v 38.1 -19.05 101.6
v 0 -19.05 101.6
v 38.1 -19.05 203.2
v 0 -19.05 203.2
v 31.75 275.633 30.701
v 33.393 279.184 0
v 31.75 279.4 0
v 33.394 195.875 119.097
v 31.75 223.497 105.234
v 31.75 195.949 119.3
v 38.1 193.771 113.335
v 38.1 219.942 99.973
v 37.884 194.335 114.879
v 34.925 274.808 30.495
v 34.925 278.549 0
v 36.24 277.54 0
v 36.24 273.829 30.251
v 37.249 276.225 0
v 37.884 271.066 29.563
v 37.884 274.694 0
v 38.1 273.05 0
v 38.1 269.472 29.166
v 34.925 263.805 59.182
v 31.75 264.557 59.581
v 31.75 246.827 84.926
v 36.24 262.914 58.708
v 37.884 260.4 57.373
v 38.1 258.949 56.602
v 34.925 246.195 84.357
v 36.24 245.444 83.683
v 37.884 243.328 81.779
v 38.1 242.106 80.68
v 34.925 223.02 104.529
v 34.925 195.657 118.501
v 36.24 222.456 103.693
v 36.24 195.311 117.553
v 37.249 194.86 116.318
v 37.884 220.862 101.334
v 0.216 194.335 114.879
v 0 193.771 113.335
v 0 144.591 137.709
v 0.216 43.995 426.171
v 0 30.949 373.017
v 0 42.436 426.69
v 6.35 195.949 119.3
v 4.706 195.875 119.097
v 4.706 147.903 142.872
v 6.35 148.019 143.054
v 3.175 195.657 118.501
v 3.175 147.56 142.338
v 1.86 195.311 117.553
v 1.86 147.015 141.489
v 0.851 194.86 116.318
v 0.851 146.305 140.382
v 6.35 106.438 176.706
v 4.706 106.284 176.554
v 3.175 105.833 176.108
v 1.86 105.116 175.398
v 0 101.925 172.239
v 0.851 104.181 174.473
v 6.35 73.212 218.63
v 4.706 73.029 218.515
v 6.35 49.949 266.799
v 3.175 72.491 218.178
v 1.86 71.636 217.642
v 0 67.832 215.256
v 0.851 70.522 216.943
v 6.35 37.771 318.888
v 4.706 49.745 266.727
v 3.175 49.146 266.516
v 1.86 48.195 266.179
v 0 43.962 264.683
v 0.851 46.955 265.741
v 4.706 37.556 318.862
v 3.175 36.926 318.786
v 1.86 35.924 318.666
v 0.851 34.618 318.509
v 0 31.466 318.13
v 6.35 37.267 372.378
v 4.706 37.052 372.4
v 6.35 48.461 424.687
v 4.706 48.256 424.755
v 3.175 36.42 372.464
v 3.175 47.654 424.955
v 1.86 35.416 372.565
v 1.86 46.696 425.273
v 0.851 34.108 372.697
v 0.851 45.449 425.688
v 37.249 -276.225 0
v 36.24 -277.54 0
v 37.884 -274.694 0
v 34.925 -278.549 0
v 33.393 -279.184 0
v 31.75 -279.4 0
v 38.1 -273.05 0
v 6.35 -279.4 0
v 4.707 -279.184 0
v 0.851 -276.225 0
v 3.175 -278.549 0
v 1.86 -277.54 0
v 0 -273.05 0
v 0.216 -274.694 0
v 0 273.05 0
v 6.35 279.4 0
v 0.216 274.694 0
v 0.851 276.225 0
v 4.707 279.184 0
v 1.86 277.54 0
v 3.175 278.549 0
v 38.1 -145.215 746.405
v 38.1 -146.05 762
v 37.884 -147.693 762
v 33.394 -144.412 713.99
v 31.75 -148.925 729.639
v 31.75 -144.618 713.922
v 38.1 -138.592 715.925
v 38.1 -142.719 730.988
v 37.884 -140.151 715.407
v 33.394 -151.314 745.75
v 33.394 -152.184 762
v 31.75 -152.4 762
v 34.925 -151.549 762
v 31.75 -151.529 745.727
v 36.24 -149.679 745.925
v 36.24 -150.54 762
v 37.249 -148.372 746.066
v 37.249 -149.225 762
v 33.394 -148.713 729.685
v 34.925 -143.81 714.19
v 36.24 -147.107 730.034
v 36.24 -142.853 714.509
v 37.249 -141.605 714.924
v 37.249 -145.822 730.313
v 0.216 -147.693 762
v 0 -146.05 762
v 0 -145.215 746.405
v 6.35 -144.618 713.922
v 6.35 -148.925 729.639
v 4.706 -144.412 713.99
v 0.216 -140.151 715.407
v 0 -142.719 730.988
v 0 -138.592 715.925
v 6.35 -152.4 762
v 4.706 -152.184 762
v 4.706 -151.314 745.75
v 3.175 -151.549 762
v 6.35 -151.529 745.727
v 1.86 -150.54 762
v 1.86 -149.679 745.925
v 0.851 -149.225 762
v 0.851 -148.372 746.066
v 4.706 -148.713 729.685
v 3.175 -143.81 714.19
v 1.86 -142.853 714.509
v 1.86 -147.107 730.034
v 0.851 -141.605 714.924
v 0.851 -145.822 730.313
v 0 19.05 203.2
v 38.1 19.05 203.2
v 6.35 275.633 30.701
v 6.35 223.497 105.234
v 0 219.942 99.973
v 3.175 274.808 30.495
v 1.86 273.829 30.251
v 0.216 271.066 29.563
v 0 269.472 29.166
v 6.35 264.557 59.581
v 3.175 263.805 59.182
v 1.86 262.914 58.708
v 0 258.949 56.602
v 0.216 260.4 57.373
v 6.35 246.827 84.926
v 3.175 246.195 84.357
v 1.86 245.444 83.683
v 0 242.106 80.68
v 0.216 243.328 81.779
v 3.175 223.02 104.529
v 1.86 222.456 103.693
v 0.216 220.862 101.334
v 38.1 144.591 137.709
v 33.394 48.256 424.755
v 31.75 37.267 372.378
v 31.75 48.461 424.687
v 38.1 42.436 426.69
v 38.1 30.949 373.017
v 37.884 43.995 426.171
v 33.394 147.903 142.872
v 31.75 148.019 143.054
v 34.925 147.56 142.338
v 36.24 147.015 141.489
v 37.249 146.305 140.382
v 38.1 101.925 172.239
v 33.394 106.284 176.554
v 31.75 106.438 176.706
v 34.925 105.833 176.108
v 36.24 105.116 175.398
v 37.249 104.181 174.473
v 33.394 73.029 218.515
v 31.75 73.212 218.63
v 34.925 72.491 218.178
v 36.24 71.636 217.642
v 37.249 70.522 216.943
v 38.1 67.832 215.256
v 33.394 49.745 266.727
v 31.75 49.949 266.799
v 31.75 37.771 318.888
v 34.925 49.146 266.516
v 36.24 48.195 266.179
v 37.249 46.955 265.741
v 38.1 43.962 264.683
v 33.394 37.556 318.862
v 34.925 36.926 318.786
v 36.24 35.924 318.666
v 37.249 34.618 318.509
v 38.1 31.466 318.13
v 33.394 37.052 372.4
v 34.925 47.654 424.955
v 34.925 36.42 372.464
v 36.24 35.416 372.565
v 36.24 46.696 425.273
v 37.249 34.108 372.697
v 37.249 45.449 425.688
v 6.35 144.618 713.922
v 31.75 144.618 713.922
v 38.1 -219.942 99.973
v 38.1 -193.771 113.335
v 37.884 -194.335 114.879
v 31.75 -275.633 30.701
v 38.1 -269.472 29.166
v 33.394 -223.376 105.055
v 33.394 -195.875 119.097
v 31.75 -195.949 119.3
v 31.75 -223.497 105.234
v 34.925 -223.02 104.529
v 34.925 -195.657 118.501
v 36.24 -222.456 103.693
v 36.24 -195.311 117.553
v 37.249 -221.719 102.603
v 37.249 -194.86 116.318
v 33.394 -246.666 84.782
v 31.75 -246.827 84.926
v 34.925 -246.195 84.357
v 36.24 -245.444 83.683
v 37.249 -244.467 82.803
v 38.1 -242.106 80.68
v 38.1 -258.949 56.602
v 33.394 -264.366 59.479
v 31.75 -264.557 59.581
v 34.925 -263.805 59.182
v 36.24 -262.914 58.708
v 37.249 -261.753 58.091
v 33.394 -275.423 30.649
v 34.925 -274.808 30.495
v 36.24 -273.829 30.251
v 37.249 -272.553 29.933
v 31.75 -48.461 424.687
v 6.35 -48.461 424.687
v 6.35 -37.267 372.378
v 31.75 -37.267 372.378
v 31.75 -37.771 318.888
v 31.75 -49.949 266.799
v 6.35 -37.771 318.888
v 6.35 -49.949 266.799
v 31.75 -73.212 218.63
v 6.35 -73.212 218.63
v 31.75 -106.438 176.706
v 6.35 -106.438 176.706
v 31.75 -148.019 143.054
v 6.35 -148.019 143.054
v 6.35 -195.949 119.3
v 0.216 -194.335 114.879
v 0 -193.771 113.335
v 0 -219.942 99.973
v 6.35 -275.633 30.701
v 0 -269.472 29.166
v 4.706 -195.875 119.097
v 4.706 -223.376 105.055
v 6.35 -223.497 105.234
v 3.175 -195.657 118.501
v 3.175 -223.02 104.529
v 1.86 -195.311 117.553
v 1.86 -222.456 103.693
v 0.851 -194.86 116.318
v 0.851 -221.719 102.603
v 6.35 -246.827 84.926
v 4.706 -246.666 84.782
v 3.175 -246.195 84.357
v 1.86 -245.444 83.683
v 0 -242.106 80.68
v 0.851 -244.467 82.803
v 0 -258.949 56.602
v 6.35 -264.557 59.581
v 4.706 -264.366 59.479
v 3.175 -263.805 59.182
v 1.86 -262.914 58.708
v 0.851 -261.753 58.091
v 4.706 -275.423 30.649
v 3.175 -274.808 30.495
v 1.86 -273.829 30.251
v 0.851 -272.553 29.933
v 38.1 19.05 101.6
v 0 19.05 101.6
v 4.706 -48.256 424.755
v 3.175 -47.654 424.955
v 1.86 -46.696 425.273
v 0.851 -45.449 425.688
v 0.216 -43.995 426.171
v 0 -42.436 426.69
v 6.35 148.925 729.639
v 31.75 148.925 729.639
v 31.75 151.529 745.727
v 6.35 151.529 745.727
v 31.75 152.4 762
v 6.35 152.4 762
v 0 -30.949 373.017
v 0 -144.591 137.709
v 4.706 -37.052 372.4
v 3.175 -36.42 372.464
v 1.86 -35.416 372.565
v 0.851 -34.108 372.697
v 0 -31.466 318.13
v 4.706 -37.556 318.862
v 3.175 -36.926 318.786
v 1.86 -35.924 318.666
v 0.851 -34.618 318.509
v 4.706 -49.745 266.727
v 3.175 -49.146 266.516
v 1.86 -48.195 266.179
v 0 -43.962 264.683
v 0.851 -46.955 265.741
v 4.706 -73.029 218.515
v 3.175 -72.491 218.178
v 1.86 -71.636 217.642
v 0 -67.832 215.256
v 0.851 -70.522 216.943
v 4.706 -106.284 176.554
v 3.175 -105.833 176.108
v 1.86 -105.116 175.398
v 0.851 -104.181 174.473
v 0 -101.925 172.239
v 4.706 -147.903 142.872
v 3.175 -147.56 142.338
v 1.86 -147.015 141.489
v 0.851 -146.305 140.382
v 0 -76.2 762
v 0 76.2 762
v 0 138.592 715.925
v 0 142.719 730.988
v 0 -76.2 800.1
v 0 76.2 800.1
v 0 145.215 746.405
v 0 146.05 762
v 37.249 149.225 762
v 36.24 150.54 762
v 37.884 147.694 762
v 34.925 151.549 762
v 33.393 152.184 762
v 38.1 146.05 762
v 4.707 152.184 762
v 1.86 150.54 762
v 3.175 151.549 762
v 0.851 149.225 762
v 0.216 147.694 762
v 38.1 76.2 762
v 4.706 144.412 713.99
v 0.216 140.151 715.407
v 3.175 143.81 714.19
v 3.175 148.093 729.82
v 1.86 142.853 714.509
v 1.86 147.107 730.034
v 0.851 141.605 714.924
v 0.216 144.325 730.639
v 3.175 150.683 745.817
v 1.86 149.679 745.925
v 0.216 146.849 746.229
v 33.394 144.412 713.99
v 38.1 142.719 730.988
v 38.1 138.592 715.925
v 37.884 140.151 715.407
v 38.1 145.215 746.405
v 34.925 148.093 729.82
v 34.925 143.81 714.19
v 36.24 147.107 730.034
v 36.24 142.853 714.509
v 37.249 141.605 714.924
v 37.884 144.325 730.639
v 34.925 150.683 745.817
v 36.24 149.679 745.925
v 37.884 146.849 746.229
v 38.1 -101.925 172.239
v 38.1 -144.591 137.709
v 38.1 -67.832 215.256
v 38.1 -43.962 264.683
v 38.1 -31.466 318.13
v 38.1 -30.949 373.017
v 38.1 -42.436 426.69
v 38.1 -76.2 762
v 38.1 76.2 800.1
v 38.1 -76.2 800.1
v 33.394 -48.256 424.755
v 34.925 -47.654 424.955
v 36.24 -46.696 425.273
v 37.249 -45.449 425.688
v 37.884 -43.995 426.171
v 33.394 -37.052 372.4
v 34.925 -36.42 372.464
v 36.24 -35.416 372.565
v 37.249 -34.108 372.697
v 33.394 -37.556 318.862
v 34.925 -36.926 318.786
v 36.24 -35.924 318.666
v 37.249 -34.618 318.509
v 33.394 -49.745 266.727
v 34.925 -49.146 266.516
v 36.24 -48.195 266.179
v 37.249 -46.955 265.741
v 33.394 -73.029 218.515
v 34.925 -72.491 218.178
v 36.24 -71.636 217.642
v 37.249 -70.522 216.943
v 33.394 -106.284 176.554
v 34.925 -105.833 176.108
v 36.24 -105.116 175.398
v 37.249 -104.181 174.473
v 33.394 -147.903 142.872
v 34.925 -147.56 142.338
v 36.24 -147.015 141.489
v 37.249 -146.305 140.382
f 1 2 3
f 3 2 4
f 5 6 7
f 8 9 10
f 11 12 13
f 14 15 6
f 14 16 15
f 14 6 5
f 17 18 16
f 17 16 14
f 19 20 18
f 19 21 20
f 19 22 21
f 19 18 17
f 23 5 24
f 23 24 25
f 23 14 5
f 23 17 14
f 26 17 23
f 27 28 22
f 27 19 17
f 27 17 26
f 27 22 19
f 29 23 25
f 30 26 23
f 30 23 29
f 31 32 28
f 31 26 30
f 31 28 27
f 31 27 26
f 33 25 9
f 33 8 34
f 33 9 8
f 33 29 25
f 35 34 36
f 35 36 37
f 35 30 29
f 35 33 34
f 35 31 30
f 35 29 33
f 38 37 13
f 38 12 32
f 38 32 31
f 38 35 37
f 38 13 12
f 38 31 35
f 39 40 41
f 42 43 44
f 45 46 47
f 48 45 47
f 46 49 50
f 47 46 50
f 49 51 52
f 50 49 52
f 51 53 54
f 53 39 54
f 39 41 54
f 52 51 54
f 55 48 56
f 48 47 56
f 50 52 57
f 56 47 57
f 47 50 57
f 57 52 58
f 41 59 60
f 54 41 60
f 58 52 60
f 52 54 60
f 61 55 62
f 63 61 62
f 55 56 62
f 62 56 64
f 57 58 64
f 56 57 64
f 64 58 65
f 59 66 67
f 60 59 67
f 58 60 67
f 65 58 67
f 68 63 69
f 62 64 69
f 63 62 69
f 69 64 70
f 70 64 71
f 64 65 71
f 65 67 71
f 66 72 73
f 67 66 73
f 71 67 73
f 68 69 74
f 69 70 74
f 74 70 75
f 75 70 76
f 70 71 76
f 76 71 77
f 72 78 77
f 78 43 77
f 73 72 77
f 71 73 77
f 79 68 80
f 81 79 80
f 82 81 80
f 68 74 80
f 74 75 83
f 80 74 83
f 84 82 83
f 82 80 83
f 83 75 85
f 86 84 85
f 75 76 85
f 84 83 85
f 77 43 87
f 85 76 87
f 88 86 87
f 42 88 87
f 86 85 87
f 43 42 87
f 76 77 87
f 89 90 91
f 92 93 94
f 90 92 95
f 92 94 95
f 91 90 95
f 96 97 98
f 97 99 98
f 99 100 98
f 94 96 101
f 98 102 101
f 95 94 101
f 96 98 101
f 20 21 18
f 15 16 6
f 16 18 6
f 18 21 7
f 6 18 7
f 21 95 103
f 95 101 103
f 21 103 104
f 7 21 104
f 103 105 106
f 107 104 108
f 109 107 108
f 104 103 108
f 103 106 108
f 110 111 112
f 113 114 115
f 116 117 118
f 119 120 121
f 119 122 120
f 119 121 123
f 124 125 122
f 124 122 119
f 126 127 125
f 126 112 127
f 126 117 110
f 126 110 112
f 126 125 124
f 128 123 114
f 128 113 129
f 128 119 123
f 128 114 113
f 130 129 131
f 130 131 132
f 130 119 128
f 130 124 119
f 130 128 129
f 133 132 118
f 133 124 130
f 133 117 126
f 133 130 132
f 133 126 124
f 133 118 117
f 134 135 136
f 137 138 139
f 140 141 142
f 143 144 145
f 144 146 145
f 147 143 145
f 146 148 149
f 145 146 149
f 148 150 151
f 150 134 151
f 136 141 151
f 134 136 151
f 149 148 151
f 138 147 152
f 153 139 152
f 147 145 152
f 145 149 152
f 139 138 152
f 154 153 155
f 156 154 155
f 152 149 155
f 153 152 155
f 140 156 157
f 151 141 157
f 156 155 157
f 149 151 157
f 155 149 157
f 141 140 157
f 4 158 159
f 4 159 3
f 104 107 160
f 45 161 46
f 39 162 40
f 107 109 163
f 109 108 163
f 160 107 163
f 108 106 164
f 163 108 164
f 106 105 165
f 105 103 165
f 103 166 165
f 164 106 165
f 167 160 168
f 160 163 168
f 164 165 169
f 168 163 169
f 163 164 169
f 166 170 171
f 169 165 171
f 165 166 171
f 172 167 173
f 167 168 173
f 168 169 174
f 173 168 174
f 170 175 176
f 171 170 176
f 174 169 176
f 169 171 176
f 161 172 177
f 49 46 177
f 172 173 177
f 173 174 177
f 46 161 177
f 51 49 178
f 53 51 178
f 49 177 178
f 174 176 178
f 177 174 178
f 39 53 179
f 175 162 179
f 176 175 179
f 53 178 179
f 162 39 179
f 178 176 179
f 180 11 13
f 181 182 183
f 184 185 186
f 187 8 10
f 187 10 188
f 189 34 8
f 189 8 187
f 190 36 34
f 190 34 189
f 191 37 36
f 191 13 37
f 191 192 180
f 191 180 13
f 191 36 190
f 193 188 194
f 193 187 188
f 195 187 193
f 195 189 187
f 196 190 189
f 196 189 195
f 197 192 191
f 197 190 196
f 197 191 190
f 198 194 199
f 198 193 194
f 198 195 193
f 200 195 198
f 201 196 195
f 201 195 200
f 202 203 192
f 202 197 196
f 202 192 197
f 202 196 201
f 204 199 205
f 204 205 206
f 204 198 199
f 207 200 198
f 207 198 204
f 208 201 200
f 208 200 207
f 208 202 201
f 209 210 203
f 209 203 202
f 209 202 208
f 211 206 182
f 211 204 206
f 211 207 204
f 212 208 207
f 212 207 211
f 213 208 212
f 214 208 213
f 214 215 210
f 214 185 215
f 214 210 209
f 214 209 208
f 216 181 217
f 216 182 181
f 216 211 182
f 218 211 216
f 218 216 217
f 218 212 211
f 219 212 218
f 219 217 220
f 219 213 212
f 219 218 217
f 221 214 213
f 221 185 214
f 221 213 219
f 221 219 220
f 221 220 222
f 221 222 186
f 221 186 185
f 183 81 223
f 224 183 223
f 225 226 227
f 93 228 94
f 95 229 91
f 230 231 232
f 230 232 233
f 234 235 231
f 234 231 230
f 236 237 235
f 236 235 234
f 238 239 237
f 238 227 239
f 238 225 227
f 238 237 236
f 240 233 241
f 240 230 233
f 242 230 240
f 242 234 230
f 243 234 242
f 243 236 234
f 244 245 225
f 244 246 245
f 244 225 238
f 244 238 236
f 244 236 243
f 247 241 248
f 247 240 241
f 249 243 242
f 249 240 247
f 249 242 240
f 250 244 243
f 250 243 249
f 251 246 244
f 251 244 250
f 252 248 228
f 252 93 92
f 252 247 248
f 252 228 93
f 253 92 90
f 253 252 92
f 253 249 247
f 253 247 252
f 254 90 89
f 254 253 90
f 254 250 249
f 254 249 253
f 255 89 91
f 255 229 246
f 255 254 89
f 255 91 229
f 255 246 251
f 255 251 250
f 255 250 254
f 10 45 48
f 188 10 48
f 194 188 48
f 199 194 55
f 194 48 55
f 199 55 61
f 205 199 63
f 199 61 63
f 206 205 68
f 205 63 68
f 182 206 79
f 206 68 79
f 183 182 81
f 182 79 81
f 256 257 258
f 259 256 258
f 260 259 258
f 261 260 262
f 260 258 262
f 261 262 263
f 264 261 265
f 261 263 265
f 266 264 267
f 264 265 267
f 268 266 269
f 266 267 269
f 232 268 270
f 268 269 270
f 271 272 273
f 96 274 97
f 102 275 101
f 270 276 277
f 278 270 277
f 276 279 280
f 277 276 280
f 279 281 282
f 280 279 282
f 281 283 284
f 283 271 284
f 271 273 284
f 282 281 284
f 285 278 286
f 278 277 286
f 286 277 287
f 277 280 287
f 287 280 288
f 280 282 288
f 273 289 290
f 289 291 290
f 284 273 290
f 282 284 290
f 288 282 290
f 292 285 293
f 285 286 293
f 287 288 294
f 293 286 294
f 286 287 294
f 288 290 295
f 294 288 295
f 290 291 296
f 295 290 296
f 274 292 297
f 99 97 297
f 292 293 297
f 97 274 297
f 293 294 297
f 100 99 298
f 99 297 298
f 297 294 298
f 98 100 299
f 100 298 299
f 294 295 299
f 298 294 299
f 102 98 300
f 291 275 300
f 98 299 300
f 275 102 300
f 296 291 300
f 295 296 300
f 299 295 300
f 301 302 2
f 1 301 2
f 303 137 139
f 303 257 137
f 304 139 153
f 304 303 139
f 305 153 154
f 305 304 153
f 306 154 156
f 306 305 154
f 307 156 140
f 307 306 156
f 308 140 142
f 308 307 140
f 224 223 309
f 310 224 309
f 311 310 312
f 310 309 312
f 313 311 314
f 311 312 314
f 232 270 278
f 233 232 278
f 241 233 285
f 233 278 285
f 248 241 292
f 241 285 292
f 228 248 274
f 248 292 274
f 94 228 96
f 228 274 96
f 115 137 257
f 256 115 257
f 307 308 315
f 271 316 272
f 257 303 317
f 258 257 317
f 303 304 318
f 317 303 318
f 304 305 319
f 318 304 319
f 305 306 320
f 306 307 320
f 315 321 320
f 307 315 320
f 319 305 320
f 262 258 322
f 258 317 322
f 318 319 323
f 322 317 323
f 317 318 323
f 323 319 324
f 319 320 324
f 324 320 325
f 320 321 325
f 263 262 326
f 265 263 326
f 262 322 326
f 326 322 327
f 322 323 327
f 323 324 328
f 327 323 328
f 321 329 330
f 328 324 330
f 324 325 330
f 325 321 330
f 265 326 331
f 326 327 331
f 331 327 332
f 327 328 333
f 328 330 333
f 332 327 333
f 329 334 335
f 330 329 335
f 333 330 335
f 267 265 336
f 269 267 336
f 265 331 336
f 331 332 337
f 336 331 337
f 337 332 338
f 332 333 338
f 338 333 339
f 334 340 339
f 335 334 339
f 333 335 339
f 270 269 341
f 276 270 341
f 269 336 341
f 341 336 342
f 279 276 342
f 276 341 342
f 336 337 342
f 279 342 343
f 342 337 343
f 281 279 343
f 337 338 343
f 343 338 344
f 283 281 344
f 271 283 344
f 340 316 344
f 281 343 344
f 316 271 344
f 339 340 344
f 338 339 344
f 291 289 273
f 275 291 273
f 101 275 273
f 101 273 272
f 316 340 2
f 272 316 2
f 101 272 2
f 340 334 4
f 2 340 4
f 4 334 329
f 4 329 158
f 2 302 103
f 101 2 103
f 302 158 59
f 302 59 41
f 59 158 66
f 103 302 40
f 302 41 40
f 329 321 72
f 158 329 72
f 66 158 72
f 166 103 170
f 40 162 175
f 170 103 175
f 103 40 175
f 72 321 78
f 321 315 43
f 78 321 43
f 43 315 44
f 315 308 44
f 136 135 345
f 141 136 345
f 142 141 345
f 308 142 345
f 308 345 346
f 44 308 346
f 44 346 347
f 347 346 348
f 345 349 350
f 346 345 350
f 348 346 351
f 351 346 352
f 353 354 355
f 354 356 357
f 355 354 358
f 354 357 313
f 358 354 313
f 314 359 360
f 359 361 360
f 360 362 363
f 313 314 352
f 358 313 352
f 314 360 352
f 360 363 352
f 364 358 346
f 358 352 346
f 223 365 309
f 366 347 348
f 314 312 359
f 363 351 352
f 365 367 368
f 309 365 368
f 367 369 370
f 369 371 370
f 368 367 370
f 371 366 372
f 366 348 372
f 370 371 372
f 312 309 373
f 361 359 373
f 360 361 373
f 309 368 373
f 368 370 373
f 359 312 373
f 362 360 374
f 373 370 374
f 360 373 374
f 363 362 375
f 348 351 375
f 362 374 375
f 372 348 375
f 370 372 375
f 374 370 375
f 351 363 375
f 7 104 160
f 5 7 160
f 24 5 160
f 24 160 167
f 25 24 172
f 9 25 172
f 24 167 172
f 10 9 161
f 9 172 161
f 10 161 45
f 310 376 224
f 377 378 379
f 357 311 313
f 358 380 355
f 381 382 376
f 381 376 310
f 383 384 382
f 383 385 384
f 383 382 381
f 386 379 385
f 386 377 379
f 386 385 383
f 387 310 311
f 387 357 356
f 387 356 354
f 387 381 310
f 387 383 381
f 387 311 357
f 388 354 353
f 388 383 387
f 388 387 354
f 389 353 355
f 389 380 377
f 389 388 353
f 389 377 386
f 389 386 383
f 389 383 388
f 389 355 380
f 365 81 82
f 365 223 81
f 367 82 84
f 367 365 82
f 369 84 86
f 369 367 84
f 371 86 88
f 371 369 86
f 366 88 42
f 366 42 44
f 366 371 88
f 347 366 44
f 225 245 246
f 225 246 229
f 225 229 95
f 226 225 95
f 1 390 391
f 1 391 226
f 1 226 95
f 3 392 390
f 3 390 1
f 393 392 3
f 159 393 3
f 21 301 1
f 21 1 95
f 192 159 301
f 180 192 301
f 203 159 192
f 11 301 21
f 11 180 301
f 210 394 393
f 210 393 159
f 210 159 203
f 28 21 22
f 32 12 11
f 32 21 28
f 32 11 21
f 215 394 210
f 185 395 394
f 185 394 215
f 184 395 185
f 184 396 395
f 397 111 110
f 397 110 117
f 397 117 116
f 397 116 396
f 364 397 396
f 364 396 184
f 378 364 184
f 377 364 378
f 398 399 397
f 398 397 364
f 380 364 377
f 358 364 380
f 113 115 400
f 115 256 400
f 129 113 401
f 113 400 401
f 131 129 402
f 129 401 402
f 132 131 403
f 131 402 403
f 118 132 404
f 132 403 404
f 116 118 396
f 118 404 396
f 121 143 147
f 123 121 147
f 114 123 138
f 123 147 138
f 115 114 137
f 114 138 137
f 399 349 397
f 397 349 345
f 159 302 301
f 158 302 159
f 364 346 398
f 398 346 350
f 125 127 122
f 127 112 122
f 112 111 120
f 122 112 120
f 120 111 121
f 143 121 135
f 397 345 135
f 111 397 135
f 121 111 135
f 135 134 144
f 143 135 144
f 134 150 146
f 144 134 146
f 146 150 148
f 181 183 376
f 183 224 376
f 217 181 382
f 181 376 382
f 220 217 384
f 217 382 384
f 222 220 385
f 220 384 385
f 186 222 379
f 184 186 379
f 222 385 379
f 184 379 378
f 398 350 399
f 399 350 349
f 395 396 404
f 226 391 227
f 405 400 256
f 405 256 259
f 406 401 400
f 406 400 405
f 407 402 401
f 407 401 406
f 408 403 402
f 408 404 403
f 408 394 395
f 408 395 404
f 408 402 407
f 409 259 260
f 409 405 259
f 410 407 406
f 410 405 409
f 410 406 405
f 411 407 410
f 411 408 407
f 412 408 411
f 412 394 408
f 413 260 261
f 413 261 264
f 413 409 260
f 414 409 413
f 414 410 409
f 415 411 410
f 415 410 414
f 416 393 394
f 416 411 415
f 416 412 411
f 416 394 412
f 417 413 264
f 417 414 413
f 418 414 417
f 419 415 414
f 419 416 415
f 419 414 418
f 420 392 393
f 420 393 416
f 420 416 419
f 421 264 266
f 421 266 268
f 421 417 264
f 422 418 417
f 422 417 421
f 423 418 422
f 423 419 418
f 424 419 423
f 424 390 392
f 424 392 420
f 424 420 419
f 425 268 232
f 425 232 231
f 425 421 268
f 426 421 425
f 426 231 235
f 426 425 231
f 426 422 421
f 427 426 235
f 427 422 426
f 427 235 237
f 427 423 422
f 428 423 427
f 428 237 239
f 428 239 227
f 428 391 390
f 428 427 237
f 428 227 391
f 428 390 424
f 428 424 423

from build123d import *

# Parameters (mm, degrees)
F1_DEPTH = 38.1
F2_R     = 6.35
F3_W     = 38.1
F3_H     = 101.6
F4_DEPTH = 38.1


with BuildPart() as f1:
    # F0 (on Right) → F1 (new body)
    with BuildSketch(Plane.YZ):
        with BuildLine():
            Line((-279.4, 0), (0, 0))
            Line((0, 0), (279.4, 0))
            ThreePointArc((279.4, 0), (256.466555, 72.795275), (195.948786, 119.300056))
            ThreePointArc((195.948786, 119.300056), (60.252824, 242.073318), (48.461383, 424.686653))
            Line((48.461383, 424.686653), (144.617616, 713.921884))
            ThreePointArc((144.617616, 713.921884), (150.441824, 737.648045), (152.4, 762))
            Line((152.4, 762), (76.2, 762))
            Line((76.2, 762), (0, 762))
            Line((0, 762), (-76.2, 762))
            Line((-76.2, 762), (-152.4, 762))
            ThreePointArc((-152.4, 762), (-150.441824, 737.648045), (-144.617616, 713.921884))
            Line((-144.617616, 713.921884), (-48.461383, 424.686653))
            ThreePointArc((-48.461383, 424.686653), (-60.252824, 242.073318), (-195.948786, 119.300056))
            ThreePointArc((-195.948786, 119.300056), (-256.466555, 72.795275), (-279.4, 0))
        make_face()
        Polygon((-76.2, 800.1), (-76.2, 762), (0, 762), (76.2, 762), (76.2, 800.1), align=None)
    extrude(amount=F1_DEPTH)

    # F2
    f2_edges = [f1.edges().sort_by_distance(p)[0] for p in [
        (38.1, -60.252824, 242.073318),
        (0, 60.252824, 242.073318),
        (38.1, 60.252824, 242.073318),
        (0, -96.539499, 569.304268),
    ]]
    fillet(f2_edges, radius=F2_R)

    # F3 (on face) → F4 (cut, through all)
    with BuildSketch(Plane(origin=(0, 0, 0), x_dir=(0, -1, 0), z_dir=(-1, 0, 0))):
        with Locations((0, 152.4)):
            Rectangle(F3_W, F3_H)
    extrude(amount=-F4_DEPTH, mode=Mode.SUBTRACT)


solid = f1.part
